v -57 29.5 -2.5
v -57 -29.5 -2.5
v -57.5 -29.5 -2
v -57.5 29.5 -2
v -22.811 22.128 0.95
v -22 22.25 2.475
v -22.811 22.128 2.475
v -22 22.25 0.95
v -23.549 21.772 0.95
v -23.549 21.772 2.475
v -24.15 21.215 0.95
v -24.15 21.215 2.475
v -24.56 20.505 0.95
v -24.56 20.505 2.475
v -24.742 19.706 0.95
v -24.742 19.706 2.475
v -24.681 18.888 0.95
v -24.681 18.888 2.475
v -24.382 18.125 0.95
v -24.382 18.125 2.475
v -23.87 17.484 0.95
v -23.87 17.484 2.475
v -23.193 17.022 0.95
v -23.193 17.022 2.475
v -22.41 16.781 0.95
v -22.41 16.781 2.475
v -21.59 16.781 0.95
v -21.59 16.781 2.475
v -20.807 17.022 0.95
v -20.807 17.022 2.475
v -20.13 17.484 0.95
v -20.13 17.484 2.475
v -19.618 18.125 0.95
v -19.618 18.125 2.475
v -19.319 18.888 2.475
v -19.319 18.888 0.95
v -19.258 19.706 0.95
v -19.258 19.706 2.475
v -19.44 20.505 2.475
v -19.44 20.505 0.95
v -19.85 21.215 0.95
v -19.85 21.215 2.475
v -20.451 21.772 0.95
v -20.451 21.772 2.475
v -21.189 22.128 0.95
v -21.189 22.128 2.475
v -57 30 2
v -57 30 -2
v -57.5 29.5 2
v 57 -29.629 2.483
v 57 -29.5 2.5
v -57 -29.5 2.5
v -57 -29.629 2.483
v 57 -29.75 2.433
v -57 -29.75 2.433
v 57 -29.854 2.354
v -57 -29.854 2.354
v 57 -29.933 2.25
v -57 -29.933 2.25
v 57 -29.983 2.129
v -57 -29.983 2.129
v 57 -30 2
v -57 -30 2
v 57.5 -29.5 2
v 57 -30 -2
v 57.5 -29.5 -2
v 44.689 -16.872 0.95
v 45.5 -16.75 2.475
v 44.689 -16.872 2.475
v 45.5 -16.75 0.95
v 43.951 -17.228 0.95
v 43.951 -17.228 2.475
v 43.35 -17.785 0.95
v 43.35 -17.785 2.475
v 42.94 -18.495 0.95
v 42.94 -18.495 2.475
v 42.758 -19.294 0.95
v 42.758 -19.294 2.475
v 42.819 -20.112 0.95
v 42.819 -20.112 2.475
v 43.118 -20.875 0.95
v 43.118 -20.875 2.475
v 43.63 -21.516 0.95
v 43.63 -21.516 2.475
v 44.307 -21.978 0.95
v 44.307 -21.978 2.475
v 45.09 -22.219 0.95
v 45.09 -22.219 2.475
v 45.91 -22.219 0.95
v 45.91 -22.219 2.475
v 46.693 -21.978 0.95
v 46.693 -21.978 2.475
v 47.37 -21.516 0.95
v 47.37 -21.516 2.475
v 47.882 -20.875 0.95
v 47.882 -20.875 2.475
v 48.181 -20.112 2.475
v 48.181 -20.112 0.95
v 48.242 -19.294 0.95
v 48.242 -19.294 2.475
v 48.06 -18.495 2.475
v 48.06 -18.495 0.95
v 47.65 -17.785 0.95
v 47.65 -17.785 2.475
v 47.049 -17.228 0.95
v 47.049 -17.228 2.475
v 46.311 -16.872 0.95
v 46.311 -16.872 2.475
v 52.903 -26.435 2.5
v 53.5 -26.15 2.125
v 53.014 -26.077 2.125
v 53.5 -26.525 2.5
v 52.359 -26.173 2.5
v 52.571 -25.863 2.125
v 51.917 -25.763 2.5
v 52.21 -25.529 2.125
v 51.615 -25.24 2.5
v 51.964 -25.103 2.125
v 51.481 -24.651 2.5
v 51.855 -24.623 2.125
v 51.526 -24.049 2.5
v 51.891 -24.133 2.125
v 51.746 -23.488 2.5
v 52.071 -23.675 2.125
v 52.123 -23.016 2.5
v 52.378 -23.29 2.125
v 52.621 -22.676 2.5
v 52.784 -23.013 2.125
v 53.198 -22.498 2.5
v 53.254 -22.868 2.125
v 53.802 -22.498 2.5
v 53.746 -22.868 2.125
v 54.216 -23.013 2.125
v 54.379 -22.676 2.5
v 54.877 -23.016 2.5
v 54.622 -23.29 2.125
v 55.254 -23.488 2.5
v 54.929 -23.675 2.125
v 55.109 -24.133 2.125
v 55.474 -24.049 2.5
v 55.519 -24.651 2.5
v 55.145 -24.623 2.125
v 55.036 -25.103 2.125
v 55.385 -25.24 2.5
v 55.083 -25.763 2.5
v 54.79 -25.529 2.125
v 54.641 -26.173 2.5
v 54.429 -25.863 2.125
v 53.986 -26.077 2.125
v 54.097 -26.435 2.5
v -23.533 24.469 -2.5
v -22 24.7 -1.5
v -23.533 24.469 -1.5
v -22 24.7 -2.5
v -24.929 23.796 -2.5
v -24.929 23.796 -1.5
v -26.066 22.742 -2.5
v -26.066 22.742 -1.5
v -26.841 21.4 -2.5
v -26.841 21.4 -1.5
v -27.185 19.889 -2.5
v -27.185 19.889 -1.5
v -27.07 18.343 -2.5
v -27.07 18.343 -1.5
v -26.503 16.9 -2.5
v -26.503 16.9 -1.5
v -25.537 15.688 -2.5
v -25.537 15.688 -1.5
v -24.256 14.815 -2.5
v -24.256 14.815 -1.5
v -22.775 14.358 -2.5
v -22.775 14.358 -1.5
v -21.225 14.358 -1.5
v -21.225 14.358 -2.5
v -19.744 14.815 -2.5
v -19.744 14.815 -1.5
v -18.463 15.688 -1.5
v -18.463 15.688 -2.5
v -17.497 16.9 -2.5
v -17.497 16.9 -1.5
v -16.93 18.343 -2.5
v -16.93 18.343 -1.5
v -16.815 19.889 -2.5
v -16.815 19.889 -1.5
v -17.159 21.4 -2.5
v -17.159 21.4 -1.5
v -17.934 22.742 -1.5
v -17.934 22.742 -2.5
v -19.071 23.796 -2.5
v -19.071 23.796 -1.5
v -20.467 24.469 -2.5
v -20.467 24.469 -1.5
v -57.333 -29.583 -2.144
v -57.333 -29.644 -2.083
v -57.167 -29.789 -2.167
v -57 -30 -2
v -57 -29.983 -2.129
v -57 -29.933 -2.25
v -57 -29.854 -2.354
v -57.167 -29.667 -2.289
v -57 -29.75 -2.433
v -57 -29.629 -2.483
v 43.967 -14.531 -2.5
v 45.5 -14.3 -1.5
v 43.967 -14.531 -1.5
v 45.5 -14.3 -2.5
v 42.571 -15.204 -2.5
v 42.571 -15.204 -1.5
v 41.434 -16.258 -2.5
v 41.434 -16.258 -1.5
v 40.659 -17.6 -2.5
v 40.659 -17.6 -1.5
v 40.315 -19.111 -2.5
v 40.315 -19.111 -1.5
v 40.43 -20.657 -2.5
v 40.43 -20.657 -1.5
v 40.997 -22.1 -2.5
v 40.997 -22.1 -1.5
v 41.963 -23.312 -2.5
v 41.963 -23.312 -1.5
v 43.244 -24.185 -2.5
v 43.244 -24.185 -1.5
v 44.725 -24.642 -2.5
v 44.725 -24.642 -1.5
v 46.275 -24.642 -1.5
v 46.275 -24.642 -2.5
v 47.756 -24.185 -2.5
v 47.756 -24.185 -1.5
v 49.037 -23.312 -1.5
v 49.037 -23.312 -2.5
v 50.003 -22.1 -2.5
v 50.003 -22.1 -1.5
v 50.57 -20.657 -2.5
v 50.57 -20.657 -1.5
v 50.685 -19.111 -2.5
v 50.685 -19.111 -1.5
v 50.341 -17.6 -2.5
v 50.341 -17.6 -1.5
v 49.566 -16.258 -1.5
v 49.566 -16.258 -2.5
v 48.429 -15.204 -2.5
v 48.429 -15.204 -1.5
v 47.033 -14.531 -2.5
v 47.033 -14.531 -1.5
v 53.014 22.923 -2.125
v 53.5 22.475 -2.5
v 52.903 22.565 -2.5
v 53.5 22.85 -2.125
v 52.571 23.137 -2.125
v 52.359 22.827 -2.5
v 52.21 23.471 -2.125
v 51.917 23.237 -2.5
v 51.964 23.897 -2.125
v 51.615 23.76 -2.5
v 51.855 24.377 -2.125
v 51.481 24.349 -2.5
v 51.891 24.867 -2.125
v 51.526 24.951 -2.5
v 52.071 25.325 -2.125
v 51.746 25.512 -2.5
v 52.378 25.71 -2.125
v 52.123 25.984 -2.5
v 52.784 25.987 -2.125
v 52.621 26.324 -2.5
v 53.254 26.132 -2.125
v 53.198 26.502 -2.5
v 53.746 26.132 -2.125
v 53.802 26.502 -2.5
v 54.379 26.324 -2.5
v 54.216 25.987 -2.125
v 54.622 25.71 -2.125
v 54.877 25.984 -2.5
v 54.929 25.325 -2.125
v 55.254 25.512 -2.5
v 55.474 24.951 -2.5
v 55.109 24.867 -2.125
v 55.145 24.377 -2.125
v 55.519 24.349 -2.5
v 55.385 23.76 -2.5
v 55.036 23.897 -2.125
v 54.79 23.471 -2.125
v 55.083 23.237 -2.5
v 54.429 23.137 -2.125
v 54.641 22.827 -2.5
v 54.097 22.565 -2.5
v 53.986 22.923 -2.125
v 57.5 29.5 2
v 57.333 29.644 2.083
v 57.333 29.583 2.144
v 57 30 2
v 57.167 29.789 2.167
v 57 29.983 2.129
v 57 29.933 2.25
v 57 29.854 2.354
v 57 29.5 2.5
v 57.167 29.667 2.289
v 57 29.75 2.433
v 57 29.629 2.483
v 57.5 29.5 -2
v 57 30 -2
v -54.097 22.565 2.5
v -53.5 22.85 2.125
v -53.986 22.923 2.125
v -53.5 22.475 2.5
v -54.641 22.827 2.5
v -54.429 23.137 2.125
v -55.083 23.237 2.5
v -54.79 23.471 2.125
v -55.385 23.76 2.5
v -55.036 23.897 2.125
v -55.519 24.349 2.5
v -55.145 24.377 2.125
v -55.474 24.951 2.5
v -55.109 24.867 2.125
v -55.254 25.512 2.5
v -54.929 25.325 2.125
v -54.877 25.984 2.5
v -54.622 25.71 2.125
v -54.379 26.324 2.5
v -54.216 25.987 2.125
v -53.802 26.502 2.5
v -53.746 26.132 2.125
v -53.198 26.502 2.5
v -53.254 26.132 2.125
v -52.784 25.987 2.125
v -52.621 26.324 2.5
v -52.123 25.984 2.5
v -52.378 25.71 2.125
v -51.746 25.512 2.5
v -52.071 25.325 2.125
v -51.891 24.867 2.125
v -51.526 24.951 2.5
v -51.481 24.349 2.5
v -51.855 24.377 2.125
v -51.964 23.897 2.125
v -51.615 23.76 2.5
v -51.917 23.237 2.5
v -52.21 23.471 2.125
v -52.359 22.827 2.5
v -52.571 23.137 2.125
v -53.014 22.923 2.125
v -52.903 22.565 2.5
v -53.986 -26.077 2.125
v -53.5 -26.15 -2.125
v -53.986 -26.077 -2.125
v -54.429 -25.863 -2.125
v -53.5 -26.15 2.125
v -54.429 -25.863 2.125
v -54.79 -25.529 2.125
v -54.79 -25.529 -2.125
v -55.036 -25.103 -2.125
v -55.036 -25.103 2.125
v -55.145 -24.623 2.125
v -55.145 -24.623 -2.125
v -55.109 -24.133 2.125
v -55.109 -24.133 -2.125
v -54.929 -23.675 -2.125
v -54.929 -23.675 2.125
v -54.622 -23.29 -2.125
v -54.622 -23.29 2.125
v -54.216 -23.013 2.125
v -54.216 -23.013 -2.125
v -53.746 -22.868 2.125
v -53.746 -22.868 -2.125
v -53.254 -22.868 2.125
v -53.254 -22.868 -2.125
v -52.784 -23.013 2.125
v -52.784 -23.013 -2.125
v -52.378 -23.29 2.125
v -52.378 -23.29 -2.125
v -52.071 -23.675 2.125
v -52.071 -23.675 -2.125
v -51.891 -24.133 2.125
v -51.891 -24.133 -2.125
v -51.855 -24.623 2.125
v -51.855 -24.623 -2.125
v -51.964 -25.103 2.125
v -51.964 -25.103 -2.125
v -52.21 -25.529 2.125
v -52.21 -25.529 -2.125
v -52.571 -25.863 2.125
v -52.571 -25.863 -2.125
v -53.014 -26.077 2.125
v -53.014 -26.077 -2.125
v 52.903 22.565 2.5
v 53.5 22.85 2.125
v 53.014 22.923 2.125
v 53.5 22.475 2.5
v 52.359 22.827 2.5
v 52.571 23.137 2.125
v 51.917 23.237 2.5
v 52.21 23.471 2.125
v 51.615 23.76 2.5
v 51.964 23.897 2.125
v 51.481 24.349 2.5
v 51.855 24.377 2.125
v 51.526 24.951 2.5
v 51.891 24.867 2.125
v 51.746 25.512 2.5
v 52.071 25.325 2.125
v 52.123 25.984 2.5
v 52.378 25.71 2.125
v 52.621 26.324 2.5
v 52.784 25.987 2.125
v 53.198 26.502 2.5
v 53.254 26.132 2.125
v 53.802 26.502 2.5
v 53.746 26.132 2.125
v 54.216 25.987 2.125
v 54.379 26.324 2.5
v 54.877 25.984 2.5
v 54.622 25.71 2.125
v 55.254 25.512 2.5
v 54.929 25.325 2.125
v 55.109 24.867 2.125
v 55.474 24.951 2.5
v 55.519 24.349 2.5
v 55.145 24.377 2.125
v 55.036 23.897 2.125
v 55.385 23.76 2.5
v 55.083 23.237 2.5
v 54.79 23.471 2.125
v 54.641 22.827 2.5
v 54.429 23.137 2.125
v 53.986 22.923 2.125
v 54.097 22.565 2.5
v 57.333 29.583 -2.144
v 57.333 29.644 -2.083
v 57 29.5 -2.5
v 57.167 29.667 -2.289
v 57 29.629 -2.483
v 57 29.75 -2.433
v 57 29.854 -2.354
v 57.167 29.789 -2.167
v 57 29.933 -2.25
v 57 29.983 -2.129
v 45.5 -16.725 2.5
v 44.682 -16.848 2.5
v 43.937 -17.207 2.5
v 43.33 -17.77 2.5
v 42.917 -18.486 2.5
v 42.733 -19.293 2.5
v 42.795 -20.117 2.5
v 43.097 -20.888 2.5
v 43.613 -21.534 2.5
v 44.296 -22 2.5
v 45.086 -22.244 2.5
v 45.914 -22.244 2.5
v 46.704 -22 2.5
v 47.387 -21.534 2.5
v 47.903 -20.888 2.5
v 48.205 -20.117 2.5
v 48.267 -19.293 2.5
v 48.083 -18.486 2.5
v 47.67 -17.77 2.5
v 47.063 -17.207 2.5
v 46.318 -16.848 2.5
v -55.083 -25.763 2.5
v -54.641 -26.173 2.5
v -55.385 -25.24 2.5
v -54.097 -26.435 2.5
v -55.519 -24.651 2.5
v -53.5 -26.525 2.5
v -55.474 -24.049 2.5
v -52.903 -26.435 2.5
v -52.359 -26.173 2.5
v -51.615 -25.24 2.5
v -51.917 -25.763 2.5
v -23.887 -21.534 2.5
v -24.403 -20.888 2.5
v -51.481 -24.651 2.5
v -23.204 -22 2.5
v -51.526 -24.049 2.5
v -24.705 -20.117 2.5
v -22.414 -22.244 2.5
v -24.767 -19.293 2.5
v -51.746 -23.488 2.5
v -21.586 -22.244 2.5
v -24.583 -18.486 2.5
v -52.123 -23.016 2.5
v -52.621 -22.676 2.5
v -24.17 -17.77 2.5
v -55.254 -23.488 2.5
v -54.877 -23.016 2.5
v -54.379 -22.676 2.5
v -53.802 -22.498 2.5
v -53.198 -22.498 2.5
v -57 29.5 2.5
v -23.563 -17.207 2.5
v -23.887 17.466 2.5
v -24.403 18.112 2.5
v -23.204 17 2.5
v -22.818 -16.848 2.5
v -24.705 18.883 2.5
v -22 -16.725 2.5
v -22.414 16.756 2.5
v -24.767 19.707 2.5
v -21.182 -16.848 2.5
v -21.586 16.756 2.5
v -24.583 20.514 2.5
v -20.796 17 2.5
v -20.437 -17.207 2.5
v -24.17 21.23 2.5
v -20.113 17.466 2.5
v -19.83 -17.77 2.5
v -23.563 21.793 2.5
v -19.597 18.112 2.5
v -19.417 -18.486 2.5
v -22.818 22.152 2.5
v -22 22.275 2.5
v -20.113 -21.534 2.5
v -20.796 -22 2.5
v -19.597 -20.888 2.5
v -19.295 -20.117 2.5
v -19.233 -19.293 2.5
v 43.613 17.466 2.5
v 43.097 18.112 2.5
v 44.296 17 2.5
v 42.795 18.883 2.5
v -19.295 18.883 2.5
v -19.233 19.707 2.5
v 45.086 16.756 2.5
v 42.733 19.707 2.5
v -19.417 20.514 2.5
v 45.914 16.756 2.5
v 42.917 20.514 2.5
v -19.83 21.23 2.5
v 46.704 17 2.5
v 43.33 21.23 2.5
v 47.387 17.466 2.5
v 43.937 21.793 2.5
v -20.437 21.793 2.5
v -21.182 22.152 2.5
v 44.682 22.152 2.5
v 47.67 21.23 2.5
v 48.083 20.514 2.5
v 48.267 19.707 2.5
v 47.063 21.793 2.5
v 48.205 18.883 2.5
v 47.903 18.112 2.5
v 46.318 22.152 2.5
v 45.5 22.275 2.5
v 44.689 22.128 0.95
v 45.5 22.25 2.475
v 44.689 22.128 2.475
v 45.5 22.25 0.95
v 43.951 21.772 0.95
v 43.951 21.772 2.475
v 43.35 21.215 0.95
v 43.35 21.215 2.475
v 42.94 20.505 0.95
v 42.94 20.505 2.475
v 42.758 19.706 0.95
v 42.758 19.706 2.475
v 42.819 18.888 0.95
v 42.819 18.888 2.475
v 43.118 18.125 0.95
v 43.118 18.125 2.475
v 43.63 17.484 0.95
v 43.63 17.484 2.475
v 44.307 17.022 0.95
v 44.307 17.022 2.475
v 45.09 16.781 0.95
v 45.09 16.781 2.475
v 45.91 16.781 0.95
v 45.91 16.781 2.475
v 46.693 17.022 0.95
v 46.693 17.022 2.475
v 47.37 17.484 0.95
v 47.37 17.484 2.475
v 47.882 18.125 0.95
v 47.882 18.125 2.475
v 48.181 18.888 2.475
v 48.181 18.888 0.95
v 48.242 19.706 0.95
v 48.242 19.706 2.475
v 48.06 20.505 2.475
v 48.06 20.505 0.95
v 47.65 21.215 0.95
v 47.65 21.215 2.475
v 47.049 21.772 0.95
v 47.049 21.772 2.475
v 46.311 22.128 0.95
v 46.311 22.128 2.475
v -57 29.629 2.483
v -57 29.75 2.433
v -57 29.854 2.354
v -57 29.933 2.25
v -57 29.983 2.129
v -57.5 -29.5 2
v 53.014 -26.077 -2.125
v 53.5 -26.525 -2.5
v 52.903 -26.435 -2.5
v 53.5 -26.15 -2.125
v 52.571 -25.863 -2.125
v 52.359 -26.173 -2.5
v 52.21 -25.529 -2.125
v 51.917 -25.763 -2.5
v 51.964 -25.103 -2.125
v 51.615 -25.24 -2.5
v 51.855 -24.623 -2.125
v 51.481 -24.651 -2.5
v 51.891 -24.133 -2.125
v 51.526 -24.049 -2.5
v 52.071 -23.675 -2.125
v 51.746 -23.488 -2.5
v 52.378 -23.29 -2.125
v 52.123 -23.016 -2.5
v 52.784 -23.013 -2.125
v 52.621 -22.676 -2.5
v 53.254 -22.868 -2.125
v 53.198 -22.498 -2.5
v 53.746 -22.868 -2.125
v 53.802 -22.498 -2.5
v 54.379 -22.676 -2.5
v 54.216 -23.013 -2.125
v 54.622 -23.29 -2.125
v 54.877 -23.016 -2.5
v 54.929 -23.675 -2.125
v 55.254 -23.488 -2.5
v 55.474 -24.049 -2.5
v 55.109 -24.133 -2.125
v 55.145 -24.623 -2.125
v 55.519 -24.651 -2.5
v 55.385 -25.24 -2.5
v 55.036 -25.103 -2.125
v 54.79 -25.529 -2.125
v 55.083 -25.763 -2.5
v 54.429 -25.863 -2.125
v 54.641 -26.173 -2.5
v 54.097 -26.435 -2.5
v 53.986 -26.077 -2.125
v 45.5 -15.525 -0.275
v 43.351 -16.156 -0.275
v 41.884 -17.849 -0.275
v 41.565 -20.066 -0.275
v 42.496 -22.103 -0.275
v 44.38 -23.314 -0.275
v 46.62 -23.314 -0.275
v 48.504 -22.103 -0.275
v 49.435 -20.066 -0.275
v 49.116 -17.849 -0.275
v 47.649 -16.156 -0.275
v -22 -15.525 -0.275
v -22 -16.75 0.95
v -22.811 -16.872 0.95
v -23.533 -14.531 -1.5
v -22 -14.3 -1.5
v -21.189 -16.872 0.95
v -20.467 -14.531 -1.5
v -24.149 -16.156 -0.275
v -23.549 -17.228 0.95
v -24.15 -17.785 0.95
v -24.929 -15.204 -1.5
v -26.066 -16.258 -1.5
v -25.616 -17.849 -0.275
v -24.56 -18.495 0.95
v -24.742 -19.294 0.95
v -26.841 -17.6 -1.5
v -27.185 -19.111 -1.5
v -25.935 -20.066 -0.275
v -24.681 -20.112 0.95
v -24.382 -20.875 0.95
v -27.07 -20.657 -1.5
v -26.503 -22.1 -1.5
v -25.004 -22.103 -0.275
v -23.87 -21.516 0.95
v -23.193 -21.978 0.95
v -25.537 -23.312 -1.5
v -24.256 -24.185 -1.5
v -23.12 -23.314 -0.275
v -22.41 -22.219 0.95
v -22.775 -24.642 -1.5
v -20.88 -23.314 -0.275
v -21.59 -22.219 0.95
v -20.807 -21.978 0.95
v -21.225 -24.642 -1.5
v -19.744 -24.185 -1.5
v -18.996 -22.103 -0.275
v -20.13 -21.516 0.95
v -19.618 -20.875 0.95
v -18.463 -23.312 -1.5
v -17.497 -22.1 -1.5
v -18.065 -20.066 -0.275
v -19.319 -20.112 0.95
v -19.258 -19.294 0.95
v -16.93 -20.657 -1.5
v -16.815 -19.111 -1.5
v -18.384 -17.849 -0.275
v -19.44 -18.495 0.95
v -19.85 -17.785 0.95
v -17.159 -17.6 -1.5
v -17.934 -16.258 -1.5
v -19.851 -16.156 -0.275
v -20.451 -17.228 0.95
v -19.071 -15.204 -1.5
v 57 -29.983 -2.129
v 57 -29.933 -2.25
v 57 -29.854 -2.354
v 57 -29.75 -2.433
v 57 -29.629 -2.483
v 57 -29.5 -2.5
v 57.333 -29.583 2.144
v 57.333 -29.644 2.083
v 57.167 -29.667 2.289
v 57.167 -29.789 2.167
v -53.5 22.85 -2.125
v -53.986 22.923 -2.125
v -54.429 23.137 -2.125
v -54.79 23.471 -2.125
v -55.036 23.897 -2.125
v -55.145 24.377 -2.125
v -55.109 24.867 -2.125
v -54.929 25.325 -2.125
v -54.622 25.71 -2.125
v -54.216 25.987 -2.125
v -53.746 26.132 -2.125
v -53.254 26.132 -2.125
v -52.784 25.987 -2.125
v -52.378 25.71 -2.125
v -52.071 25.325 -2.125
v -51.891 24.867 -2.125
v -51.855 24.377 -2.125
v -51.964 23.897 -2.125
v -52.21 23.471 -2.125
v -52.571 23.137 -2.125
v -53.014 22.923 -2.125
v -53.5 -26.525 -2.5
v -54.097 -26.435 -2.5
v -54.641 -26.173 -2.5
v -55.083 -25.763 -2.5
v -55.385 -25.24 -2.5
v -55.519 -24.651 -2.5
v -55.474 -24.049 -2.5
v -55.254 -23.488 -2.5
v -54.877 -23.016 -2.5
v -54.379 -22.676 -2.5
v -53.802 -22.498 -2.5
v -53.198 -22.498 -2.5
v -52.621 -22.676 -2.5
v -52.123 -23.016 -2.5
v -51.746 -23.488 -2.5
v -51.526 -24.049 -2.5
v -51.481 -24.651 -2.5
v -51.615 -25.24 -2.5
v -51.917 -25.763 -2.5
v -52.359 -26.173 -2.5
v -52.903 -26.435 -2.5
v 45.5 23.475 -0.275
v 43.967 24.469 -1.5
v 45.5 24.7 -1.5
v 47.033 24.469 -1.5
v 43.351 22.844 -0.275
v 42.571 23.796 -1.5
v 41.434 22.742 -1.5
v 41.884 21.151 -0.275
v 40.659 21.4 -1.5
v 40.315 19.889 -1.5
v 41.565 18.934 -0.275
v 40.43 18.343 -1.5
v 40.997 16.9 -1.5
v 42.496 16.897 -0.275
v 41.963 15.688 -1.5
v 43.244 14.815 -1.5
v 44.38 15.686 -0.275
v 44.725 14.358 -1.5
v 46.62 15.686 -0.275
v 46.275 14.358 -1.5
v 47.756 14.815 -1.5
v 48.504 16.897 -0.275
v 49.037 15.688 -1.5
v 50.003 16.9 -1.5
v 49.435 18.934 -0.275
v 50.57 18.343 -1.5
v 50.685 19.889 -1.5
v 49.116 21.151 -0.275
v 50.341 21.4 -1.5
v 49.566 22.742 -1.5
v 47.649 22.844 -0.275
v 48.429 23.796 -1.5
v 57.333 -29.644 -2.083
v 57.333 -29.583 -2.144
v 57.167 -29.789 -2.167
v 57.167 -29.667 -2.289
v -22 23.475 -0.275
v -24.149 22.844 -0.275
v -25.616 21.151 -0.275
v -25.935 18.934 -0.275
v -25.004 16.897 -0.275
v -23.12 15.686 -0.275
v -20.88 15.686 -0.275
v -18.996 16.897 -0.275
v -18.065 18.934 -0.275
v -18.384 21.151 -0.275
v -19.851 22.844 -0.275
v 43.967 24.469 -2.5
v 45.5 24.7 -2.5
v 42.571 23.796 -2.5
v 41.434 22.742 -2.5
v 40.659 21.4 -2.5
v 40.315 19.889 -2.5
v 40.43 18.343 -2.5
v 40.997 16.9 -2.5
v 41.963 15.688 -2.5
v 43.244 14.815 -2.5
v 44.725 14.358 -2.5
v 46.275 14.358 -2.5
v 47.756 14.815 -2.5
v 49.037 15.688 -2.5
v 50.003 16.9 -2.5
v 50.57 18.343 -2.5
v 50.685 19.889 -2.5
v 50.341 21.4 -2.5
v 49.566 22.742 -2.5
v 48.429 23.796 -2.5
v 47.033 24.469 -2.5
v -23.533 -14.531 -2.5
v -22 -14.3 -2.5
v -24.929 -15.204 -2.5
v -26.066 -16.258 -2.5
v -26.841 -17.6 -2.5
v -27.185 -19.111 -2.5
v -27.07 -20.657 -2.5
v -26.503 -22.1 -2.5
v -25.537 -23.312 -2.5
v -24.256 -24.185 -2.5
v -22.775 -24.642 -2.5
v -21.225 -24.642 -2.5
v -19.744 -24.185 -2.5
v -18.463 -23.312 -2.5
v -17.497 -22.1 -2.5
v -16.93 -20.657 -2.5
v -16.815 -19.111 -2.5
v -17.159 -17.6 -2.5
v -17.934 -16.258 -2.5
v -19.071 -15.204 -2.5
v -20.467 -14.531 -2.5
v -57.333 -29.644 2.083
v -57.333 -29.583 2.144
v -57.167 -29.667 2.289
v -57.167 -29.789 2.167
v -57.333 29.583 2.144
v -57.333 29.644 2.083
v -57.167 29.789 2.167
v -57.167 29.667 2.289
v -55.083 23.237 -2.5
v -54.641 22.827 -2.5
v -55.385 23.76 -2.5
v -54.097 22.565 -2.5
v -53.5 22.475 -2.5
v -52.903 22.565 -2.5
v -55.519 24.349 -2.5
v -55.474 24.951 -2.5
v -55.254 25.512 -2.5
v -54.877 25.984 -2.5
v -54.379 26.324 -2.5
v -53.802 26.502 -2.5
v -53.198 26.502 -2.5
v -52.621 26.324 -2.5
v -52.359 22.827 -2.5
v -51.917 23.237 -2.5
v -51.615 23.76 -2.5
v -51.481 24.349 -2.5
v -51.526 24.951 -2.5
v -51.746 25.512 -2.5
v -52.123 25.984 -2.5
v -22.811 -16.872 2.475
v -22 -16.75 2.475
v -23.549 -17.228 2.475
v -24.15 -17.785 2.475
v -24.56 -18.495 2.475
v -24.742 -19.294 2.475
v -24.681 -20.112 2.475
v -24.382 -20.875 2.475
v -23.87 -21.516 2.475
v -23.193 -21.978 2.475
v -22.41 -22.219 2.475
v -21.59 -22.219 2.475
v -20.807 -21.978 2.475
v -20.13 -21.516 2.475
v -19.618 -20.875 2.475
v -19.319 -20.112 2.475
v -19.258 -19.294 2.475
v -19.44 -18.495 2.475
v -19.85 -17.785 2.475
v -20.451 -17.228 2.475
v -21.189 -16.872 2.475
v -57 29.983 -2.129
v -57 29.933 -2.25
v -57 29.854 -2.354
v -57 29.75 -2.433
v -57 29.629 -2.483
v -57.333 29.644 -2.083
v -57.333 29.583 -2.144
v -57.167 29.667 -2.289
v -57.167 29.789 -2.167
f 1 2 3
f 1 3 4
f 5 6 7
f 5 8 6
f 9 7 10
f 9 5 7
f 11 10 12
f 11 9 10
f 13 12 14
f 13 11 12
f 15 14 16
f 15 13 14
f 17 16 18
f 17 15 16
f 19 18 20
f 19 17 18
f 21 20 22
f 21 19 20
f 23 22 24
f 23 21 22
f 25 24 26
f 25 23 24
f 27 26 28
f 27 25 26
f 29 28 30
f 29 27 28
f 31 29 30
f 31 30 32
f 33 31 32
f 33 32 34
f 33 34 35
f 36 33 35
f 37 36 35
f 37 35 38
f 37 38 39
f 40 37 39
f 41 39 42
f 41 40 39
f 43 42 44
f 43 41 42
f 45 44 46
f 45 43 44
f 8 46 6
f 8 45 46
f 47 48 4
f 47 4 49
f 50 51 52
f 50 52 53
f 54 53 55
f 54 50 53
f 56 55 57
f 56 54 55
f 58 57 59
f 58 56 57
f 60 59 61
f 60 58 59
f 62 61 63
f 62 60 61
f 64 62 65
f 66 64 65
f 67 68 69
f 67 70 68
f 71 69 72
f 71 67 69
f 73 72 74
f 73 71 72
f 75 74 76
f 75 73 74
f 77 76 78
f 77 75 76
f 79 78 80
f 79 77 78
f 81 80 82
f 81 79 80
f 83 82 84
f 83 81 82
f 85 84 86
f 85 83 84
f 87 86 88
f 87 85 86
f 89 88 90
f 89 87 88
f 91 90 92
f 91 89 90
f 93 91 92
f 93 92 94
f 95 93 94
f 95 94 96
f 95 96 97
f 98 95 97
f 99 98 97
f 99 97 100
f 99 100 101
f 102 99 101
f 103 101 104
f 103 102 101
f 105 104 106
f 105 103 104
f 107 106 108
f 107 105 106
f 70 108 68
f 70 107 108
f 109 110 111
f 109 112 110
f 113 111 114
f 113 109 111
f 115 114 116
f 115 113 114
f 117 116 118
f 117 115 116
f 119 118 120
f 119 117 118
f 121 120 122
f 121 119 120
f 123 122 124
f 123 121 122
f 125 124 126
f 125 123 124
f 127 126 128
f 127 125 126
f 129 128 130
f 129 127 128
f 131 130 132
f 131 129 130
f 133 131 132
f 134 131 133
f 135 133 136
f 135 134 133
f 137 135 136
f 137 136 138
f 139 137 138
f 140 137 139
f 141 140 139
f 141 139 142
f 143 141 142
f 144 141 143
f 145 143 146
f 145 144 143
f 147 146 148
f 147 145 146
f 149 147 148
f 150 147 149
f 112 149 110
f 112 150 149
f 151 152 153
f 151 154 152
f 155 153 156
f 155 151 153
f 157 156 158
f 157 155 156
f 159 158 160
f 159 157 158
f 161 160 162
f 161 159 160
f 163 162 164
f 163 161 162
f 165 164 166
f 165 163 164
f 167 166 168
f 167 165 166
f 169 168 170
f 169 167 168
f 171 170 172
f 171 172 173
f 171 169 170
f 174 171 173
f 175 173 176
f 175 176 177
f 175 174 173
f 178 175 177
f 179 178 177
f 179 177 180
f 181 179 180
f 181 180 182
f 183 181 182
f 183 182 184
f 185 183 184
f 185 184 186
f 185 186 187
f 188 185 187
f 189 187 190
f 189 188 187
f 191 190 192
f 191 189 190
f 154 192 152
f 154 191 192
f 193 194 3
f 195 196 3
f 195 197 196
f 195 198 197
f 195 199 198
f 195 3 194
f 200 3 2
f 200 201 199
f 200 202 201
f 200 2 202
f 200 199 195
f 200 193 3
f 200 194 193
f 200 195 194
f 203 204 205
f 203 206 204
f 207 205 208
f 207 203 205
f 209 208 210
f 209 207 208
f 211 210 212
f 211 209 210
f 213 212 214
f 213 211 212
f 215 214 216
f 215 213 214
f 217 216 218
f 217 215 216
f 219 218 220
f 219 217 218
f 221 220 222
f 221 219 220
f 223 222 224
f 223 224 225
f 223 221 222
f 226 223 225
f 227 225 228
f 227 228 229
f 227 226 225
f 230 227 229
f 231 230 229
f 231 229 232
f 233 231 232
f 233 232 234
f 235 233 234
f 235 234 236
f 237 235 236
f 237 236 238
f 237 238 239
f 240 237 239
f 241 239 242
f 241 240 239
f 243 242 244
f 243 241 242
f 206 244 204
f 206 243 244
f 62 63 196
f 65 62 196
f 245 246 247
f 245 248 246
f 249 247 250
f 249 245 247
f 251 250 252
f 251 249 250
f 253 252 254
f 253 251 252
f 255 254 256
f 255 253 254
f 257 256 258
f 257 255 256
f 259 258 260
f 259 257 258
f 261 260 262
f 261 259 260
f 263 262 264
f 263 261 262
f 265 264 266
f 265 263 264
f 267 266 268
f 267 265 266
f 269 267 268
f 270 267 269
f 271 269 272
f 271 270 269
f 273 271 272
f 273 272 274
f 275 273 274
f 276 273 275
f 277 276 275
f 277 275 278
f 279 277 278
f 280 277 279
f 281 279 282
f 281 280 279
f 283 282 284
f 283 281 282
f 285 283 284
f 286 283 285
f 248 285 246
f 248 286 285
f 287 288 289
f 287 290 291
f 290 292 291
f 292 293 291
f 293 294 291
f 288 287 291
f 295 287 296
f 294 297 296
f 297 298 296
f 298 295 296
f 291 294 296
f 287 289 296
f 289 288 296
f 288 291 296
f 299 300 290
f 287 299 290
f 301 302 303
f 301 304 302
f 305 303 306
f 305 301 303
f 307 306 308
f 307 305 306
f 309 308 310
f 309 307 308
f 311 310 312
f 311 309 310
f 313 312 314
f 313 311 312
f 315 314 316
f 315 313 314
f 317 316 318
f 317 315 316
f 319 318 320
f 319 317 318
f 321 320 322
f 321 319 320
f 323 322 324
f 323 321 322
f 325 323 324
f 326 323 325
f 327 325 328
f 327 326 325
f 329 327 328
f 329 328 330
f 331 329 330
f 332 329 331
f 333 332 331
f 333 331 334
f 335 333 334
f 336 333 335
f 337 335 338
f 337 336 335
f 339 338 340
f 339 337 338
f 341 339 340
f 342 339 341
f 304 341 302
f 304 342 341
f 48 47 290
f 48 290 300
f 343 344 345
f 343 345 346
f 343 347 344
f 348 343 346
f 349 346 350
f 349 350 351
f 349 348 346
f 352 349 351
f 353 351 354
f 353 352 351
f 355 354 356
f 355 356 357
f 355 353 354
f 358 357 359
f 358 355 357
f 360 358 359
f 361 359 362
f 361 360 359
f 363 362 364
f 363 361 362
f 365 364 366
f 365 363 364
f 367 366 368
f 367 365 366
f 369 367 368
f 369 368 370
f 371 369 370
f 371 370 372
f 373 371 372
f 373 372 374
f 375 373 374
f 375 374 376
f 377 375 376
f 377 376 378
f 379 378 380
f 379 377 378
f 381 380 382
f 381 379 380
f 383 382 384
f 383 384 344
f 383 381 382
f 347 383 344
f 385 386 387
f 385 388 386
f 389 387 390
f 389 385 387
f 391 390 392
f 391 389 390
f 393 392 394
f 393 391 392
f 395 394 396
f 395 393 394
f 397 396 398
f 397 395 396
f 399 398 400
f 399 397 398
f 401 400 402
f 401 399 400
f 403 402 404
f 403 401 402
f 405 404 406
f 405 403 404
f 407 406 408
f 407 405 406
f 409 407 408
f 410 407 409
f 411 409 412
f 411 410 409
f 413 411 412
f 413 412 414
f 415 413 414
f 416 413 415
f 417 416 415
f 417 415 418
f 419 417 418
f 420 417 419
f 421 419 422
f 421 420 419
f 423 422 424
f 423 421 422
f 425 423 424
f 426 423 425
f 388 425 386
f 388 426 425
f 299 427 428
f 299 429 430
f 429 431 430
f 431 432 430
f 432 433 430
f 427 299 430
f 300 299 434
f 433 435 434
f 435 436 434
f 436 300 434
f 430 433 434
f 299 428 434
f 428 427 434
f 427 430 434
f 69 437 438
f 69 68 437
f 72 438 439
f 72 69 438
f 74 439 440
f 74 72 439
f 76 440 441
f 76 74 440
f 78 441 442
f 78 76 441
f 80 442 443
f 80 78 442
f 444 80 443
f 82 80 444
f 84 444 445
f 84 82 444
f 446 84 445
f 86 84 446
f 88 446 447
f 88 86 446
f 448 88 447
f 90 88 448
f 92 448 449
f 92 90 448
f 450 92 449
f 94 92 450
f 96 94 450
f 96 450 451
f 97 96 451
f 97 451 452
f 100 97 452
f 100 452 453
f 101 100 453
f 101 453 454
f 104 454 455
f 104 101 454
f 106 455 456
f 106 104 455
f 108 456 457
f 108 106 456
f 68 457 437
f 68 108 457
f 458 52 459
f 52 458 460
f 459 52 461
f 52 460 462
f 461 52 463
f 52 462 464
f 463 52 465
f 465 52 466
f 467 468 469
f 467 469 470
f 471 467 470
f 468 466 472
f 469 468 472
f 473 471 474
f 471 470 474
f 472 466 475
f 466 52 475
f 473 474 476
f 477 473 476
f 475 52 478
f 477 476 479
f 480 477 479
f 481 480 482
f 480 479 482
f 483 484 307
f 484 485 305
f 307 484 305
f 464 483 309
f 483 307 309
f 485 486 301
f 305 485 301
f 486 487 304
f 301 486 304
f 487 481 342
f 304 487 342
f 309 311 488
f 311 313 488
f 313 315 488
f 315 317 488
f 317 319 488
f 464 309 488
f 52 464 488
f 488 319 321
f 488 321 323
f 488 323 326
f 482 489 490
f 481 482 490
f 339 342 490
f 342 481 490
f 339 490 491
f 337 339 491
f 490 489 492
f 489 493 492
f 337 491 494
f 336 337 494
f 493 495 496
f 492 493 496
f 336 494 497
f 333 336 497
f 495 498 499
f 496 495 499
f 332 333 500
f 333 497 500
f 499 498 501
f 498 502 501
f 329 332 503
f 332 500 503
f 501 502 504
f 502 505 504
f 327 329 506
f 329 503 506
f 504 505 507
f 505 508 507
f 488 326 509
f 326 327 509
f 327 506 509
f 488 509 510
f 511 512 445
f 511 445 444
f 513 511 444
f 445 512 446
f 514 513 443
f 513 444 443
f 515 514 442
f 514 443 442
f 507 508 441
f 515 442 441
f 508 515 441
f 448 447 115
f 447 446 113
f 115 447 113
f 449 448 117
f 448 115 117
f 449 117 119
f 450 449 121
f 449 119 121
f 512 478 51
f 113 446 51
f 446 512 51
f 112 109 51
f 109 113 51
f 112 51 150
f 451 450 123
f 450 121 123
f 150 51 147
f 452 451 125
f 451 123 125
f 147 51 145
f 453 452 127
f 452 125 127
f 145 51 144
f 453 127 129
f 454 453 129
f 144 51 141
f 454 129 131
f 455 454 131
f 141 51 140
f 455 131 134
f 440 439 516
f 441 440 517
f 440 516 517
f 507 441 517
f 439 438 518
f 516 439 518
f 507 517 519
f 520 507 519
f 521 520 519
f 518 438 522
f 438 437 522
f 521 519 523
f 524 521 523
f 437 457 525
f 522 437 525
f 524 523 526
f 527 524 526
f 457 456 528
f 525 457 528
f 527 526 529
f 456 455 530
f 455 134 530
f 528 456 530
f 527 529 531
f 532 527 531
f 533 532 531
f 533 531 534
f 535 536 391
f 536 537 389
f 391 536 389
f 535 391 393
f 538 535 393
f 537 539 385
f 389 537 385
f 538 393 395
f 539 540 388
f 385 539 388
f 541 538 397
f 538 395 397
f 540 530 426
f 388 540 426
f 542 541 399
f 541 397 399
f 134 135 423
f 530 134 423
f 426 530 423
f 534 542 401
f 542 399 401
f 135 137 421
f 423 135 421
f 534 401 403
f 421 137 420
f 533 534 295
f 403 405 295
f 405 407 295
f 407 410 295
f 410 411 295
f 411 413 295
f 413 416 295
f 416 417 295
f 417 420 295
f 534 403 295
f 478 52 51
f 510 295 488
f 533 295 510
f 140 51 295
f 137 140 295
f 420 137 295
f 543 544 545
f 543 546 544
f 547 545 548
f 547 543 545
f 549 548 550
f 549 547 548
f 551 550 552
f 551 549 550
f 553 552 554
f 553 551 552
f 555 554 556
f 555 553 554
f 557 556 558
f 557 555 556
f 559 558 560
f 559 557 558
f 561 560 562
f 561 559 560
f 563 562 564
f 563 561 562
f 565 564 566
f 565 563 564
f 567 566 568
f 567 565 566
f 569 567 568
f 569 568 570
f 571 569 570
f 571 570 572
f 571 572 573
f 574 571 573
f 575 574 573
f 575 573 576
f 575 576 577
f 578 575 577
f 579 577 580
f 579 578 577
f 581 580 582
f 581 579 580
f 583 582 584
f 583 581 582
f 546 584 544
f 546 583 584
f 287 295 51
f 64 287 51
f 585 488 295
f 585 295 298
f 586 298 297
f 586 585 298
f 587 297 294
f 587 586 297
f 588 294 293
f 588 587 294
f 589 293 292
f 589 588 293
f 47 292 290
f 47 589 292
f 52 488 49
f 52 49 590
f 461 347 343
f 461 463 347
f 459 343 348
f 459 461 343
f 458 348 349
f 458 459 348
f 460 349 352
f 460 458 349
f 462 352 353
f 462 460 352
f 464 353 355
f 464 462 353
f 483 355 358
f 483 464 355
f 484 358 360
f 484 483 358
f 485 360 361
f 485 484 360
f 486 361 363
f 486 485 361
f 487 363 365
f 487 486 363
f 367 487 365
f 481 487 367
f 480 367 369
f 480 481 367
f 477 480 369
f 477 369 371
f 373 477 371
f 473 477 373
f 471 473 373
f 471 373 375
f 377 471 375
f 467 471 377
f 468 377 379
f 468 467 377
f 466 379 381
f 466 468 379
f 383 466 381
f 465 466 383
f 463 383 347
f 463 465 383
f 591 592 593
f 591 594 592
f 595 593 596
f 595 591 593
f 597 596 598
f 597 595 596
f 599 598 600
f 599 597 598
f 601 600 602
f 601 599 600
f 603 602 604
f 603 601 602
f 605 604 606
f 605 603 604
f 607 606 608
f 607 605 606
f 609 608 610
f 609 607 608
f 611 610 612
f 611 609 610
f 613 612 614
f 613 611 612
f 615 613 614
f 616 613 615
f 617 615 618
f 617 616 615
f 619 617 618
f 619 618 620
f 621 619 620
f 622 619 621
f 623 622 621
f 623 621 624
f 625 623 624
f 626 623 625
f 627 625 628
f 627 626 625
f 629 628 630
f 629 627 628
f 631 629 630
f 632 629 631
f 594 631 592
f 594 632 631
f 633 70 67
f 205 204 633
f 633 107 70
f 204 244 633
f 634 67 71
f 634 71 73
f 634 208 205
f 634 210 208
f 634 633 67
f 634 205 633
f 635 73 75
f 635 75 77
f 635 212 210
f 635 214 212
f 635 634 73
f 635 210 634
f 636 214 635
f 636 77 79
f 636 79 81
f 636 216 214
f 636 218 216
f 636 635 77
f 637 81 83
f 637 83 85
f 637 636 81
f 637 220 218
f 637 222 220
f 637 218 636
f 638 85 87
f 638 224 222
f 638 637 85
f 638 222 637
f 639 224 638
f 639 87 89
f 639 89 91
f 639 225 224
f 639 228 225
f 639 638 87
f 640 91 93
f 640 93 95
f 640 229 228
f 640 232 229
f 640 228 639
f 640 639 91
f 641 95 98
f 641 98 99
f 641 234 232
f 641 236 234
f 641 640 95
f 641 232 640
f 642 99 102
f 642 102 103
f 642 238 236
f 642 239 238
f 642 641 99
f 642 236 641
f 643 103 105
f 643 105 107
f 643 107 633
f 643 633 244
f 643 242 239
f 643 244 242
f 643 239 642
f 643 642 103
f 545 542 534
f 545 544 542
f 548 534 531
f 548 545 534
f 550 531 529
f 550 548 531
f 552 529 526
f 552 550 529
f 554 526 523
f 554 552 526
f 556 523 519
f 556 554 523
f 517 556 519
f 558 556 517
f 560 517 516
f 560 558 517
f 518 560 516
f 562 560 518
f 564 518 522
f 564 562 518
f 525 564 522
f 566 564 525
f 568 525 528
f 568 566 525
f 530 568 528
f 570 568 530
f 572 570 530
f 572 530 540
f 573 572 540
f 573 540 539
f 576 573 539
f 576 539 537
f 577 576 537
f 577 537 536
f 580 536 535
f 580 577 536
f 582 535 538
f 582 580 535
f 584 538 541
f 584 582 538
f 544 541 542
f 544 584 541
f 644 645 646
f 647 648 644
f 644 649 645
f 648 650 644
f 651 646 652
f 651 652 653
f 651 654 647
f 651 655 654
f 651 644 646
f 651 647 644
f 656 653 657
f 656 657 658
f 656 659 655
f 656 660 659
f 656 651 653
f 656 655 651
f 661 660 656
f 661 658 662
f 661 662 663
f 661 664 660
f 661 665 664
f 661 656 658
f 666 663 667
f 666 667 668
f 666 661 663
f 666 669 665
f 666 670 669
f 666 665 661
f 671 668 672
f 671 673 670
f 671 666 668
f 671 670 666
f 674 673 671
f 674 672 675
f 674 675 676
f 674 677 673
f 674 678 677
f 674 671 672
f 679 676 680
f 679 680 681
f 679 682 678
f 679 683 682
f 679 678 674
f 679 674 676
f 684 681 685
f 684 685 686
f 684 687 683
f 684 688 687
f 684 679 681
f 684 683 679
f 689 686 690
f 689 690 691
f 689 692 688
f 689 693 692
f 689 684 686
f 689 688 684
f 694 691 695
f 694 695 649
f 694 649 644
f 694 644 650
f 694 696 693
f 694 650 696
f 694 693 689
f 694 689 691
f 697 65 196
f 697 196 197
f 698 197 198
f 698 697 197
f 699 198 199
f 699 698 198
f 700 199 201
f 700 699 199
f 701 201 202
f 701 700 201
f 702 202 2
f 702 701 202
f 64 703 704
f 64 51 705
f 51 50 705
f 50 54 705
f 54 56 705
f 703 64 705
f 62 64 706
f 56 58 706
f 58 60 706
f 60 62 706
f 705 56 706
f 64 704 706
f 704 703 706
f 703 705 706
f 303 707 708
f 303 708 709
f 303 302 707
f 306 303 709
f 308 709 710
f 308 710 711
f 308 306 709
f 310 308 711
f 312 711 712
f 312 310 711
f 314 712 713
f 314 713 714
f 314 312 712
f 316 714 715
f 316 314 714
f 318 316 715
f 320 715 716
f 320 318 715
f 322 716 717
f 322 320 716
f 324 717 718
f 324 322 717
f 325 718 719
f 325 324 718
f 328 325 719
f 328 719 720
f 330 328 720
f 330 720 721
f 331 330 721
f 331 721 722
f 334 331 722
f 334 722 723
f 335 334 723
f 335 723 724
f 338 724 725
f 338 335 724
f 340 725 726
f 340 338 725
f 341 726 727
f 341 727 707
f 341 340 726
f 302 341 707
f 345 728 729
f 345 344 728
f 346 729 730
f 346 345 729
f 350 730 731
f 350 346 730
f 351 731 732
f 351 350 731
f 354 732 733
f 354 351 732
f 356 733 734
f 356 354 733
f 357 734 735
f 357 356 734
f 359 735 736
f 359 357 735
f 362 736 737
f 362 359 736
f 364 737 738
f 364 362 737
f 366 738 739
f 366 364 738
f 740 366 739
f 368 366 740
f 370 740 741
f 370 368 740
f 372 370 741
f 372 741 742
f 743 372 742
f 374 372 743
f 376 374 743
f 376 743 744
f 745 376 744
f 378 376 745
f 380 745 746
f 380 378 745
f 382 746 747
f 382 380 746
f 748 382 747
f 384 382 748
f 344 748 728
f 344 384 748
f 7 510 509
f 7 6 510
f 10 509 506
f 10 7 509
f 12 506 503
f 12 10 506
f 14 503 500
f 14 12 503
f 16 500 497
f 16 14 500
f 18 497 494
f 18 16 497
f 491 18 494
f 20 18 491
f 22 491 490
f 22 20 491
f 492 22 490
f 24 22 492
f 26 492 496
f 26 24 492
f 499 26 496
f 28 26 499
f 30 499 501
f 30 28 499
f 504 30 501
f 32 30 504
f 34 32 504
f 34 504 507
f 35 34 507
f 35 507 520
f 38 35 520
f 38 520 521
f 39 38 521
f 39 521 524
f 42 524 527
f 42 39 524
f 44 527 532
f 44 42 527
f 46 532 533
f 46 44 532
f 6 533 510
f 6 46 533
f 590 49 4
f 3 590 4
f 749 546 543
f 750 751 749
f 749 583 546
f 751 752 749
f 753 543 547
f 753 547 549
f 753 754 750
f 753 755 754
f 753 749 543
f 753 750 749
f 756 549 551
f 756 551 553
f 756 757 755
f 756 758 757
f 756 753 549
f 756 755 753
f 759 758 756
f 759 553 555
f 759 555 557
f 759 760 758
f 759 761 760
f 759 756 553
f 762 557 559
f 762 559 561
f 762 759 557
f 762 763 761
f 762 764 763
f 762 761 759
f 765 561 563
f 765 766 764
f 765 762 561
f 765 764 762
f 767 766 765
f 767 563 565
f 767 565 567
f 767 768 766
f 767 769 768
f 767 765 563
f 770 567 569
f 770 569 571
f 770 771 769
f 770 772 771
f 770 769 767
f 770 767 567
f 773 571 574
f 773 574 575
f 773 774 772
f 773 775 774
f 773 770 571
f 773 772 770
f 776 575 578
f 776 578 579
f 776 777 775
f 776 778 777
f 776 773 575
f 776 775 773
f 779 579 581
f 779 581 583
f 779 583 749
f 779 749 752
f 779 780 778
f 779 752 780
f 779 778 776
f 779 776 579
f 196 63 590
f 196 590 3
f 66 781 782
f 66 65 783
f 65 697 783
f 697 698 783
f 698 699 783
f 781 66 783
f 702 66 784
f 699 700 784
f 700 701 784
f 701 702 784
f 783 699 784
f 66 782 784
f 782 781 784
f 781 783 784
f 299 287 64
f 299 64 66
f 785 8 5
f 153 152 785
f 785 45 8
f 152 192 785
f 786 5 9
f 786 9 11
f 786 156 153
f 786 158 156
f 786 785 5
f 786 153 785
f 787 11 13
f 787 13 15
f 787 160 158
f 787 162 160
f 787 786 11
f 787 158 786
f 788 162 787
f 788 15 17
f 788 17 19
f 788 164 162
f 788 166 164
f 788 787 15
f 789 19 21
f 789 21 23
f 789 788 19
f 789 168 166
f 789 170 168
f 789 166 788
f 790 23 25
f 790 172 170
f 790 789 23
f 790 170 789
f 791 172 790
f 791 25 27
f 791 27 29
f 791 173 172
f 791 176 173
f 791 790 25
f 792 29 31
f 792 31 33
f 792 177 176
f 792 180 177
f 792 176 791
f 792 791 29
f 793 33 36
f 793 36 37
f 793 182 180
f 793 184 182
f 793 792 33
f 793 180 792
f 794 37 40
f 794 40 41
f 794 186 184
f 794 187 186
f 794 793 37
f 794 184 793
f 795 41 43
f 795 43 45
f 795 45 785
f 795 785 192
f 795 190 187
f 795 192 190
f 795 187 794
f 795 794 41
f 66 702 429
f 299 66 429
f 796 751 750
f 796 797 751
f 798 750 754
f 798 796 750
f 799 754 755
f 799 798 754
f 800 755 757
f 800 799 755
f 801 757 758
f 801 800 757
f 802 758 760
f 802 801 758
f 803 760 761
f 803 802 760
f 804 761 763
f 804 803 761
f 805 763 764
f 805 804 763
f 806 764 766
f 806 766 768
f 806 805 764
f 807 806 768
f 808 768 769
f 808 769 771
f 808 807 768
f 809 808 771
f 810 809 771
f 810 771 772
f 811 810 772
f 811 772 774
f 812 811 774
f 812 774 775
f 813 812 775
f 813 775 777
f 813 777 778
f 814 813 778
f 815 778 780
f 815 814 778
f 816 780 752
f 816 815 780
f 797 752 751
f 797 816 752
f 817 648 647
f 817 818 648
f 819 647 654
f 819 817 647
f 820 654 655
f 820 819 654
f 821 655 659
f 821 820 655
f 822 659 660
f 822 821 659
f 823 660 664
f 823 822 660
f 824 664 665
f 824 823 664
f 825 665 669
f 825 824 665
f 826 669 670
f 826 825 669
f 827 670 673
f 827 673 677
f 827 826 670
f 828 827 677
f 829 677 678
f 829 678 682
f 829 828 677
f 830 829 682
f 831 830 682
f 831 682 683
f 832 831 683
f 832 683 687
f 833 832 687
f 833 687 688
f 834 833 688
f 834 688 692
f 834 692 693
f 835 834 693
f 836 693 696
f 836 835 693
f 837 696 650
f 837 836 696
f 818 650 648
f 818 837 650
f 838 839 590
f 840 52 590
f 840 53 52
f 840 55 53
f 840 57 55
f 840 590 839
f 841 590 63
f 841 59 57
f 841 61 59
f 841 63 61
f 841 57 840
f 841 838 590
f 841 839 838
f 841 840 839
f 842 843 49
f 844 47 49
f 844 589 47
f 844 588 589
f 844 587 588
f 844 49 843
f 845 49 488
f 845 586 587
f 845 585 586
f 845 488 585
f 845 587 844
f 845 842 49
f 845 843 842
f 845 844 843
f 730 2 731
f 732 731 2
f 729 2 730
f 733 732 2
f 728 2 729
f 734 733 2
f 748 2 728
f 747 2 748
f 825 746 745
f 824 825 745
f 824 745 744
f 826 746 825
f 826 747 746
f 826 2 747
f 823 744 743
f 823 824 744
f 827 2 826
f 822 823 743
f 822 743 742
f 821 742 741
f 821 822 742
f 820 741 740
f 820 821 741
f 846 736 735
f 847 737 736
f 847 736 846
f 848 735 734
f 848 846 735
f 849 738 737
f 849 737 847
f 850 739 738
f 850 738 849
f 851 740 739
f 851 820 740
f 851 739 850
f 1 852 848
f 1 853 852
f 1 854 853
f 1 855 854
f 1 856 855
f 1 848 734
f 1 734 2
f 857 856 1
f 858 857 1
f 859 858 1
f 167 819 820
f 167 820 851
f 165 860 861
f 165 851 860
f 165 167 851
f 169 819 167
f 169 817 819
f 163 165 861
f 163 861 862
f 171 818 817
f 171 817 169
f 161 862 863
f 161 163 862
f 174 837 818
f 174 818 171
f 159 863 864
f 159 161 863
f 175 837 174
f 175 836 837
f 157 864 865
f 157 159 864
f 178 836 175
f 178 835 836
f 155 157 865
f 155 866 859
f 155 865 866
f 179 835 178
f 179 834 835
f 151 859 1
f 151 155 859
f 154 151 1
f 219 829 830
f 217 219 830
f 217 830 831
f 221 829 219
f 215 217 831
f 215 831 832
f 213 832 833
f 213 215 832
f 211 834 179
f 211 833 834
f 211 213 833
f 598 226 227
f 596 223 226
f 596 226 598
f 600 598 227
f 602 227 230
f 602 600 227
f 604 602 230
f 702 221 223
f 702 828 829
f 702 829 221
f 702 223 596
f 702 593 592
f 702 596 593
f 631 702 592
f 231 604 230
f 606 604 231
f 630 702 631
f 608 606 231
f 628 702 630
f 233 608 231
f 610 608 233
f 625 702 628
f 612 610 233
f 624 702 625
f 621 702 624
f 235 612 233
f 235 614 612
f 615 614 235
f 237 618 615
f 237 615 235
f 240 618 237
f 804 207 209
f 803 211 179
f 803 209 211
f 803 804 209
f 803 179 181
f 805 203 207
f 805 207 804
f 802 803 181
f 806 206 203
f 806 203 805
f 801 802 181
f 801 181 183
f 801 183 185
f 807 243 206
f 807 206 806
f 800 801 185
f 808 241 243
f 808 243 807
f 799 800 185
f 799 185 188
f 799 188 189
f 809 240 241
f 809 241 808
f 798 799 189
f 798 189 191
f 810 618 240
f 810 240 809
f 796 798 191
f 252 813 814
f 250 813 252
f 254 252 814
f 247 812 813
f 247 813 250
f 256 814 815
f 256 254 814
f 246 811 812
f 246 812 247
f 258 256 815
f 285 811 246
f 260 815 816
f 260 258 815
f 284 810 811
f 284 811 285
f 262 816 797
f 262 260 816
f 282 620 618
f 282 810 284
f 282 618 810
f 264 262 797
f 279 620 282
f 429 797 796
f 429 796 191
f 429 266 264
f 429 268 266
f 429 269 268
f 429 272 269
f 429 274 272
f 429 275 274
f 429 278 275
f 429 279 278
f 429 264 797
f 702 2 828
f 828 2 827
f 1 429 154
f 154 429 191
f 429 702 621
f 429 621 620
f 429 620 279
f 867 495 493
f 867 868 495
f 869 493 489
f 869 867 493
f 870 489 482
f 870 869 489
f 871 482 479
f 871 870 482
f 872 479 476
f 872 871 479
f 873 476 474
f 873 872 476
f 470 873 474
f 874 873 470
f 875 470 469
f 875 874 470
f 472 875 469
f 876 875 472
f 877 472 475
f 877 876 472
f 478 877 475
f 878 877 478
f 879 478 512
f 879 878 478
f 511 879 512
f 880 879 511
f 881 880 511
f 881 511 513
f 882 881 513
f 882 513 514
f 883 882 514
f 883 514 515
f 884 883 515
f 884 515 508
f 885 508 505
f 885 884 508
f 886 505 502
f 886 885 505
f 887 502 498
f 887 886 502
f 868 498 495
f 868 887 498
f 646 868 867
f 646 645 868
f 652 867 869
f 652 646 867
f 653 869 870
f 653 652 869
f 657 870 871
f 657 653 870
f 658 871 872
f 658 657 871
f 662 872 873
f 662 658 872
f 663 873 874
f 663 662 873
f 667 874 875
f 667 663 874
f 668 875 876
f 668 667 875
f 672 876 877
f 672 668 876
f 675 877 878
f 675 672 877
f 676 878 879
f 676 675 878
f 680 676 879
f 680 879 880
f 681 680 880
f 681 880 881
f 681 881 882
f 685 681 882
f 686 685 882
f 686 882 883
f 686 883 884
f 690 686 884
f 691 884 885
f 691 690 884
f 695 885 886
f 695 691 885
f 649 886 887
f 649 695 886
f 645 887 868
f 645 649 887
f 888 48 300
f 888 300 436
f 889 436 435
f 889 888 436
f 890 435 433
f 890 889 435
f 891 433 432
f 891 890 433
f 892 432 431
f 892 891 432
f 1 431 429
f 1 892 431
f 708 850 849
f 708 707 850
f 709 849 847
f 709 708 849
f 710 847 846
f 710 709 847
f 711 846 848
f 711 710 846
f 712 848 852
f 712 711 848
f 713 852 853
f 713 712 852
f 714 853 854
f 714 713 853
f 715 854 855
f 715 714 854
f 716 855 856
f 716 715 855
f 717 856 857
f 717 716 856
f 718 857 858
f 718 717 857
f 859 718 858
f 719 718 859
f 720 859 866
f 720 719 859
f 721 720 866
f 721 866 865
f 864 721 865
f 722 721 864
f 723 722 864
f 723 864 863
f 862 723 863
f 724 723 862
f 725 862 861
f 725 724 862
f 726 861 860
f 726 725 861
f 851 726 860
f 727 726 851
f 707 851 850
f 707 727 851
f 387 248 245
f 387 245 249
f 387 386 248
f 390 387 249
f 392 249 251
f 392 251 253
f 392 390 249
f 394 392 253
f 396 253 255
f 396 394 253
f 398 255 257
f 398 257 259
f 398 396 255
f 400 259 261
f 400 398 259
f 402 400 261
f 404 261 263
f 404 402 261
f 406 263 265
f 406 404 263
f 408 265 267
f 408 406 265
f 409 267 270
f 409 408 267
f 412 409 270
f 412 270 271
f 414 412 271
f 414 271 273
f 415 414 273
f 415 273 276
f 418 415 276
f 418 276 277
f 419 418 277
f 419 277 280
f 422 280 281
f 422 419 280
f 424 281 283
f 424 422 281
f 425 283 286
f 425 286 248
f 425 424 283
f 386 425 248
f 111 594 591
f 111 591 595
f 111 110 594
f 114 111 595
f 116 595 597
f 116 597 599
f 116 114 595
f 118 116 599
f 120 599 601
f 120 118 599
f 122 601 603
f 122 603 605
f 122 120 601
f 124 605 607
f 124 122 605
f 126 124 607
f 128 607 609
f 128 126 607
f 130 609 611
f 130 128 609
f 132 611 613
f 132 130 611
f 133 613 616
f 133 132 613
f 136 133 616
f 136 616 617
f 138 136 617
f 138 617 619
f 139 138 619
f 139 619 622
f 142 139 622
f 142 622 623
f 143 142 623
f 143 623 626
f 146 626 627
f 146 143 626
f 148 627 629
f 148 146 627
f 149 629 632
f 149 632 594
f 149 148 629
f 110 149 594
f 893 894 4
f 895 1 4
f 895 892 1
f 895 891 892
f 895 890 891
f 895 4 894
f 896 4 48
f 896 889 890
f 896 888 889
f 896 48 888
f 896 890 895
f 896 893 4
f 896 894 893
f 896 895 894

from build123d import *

# Parameters (mm, degrees)
SKETCH1_W                                    = 5
SKETCH1_H                                    = 60
BOSS_EXTRUDE1_DEPTH                          = 57.5
M4_TAPPED_HOLE1_AT_2_COUNT                   = 2
M4_TAPPED_HOLE1_AT_2_PITCH                   = 107
M4_TAPPED_HOLE1_AT_3_COUNT                   = 2
M4_TAPPED_HOLE1_AT_3_PITCH                   = 49
M4_TAPPED_HOLE1_AT_4_COUNT                   = 2
M4_TAPPED_HOLE1_AT_4_PITCH                   = 117.686022959
CSK_FOR_M5_COUNTERSUNK_FLAT_HEAD_SCR_2_COUNT = 2
CSK_FOR_M5_COUNTERSUNK_FLAT_HEAD_SCR_2_PITCH = 77.956718761
CSK_FOR_M5_COUNTERSUNK_FLAT_HEAD_SCR_3_COUNT = 2
CSK_FOR_M5_COUNTERSUNK_FLAT_HEAD_SCR_3_PITCH = 67.5
CSK_FOR_M5_COUNTERSUNK_FLAT_HEAD_SCR_4_COUNT = 2
CSK_FOR_M5_COUNTERSUNK_FLAT_HEAD_SCR_4_PITCH = 39
FILLET1_R                                    = 0.5
CHAMFER1_SIZE                                = 0.5


with BuildPart() as part:
    # Sketch1 → Boss-Extrude1 (new body, symmetric)
    with BuildSketch(Plane(origin=(0, 0, 0), x_dir=(0, 0, -1), z_dir=(1, 0, 0))):
        Rectangle(SKETCH1_W, SKETCH1_H)
    extrude(amount=BOSS_EXTRUDE1_DEPTH, both=True)

    # Sketch3 → M4 Tapped Hole1 (revolve, cut)
    with BuildSketch(Plane(origin=(-53.5, 24.5, 2.5), x_dir=(0, -1, 0), z_dir=(1, 0, 0))):
        Polygon((0, 0), (0, 5), (2.025, 5), (1.65, 4.625), (1.65, 0.375), (2.025, 0), align=None)
    m4_tapped_hole1 = revolve(axis=Axis((-53.5, 24.5, 8.85), (0, 0, -1)), mode=Mode.SUBTRACT)

    # M4 Tapped Hole1 at 2: M4 Tapped Hole1 ×2
    with Locations(*[(i * M4_TAPPED_HOLE1_AT_2_PITCH, 0, 0) for i in range(1, M4_TAPPED_HOLE1_AT_2_COUNT)]):
        add(m4_tapped_hole1, mode=Mode.SUBTRACT)

    # M4 Tapped Hole1 at 3: M4 Tapped Hole1 ×2
    with Locations(*[(0, -i * M4_TAPPED_HOLE1_AT_3_PITCH, 0) for i in range(1, M4_TAPPED_HOLE1_AT_3_COUNT)]):
        add(m4_tapped_hole1, mode=Mode.SUBTRACT)

    # M4 Tapped Hole1 at 4: M4 Tapped Hole1 ×2
    with Locations(*[Vector(0.909198878, -0.416362103, 0) * (i * M4_TAPPED_HOLE1_AT_4_PITCH) for i in range(1, M4_TAPPED_HOLE1_AT_4_COUNT)]):
        add(m4_tapped_hole1, mode=Mode.SUBTRACT)

    # Sketch6 → CSK for M5 Countersunk Flat Head Screw1 (revolve, cut)
    with BuildSketch(Plane(origin=(-22, 19.5, -2.5), x_dir=(0, 1, 0), z_dir=(1, 0, 0))):
        Polygon((0, 0), (0, 5), (2.775, 5), (2.75, 4.975), (2.75, 3.45), (5.2, 1), (5.2, 0), align=None)
    csk_for_m5_countersunk_flat_head_screw1 = revolve(axis=Axis((-22, 19.5, -8.85), (0, 0, 1)), mode=Mode.SUBTRACT)

    # CSK for M5 Countersunk Flat Head Scr 2: CSK for M5 Countersunk Flat Head Screw1 ×2
    with Locations(*[Vector(0.865865073, -0.500277598, 0) * (i * CSK_FOR_M5_COUNTERSUNK_FLAT_HEAD_SCR_2_PITCH) for i in range(1, CSK_FOR_M5_COUNTERSUNK_FLAT_HEAD_SCR_2_COUNT)]):
        add(csk_for_m5_countersunk_flat_head_screw1, mode=Mode.SUBTRACT)

    # CSK for M5 Countersunk Flat Head Scr 3: CSK for M5 Countersunk Flat Head Screw1 ×2
    with Locations(*[(i * CSK_FOR_M5_COUNTERSUNK_FLAT_HEAD_SCR_3_PITCH, 0, 0) for i in range(1, CSK_FOR_M5_COUNTERSUNK_FLAT_HEAD_SCR_3_COUNT)]):
        add(csk_for_m5_countersunk_flat_head_screw1, mode=Mode.SUBTRACT)

    # CSK for M5 Countersunk Flat Head Scr 4: CSK for M5 Countersunk Flat Head Screw1 ×2
    with Locations(*[(0, -i * CSK_FOR_M5_COUNTERSUNK_FLAT_HEAD_SCR_4_PITCH, 0) for i in range(1, CSK_FOR_M5_COUNTERSUNK_FLAT_HEAD_SCR_4_COUNT)]):
        add(csk_for_m5_countersunk_flat_head_screw1, mode=Mode.SUBTRACT)

    # Fillet1
    fillet1_edges = [part.edges().sort_by_distance(p)[0] for p in [
        (0, -30, -2.5),
        (0, -30, 2.5),
        (0, 30, 2.5),
        (0, 30, -2.5),
    ]]
    fillet(fillet1_edges, radius=FILLET1_R)

    # Chamfer1
    chamfer1_edges = [part.edges().sort_by_distance(p)[0] for p in [
        (-57.5, 0, -2.5),
        (57.5, 0, -2.5),
        (-57.5, -30, 0),
        (-57.5, 0, 2.5),
        (-57.5, 30, 0),
        (-57.5, 29.853553391, 2.353553391),
        (-57.5, 29.853553391, -2.353553391),
        (-57.5, -29.853553391, 2.353553391),
        (-57.5, -29.853553391, -2.353553391),
        (57.5, -30, 0),
        (57.5, 30, 0),
        (57.5, 0, 2.5),
        (57.5, 29.853553391, 2.353553391),
        (57.5, 29.853553391, -2.353553391),
        (57.5, -29.853553391, 2.353553391),
        (57.5, -29.853553391, -2.353553391),
    ]]
    chamfer(chamfer1_edges, length=CHAMFER1_SIZE)


solid = part.part
